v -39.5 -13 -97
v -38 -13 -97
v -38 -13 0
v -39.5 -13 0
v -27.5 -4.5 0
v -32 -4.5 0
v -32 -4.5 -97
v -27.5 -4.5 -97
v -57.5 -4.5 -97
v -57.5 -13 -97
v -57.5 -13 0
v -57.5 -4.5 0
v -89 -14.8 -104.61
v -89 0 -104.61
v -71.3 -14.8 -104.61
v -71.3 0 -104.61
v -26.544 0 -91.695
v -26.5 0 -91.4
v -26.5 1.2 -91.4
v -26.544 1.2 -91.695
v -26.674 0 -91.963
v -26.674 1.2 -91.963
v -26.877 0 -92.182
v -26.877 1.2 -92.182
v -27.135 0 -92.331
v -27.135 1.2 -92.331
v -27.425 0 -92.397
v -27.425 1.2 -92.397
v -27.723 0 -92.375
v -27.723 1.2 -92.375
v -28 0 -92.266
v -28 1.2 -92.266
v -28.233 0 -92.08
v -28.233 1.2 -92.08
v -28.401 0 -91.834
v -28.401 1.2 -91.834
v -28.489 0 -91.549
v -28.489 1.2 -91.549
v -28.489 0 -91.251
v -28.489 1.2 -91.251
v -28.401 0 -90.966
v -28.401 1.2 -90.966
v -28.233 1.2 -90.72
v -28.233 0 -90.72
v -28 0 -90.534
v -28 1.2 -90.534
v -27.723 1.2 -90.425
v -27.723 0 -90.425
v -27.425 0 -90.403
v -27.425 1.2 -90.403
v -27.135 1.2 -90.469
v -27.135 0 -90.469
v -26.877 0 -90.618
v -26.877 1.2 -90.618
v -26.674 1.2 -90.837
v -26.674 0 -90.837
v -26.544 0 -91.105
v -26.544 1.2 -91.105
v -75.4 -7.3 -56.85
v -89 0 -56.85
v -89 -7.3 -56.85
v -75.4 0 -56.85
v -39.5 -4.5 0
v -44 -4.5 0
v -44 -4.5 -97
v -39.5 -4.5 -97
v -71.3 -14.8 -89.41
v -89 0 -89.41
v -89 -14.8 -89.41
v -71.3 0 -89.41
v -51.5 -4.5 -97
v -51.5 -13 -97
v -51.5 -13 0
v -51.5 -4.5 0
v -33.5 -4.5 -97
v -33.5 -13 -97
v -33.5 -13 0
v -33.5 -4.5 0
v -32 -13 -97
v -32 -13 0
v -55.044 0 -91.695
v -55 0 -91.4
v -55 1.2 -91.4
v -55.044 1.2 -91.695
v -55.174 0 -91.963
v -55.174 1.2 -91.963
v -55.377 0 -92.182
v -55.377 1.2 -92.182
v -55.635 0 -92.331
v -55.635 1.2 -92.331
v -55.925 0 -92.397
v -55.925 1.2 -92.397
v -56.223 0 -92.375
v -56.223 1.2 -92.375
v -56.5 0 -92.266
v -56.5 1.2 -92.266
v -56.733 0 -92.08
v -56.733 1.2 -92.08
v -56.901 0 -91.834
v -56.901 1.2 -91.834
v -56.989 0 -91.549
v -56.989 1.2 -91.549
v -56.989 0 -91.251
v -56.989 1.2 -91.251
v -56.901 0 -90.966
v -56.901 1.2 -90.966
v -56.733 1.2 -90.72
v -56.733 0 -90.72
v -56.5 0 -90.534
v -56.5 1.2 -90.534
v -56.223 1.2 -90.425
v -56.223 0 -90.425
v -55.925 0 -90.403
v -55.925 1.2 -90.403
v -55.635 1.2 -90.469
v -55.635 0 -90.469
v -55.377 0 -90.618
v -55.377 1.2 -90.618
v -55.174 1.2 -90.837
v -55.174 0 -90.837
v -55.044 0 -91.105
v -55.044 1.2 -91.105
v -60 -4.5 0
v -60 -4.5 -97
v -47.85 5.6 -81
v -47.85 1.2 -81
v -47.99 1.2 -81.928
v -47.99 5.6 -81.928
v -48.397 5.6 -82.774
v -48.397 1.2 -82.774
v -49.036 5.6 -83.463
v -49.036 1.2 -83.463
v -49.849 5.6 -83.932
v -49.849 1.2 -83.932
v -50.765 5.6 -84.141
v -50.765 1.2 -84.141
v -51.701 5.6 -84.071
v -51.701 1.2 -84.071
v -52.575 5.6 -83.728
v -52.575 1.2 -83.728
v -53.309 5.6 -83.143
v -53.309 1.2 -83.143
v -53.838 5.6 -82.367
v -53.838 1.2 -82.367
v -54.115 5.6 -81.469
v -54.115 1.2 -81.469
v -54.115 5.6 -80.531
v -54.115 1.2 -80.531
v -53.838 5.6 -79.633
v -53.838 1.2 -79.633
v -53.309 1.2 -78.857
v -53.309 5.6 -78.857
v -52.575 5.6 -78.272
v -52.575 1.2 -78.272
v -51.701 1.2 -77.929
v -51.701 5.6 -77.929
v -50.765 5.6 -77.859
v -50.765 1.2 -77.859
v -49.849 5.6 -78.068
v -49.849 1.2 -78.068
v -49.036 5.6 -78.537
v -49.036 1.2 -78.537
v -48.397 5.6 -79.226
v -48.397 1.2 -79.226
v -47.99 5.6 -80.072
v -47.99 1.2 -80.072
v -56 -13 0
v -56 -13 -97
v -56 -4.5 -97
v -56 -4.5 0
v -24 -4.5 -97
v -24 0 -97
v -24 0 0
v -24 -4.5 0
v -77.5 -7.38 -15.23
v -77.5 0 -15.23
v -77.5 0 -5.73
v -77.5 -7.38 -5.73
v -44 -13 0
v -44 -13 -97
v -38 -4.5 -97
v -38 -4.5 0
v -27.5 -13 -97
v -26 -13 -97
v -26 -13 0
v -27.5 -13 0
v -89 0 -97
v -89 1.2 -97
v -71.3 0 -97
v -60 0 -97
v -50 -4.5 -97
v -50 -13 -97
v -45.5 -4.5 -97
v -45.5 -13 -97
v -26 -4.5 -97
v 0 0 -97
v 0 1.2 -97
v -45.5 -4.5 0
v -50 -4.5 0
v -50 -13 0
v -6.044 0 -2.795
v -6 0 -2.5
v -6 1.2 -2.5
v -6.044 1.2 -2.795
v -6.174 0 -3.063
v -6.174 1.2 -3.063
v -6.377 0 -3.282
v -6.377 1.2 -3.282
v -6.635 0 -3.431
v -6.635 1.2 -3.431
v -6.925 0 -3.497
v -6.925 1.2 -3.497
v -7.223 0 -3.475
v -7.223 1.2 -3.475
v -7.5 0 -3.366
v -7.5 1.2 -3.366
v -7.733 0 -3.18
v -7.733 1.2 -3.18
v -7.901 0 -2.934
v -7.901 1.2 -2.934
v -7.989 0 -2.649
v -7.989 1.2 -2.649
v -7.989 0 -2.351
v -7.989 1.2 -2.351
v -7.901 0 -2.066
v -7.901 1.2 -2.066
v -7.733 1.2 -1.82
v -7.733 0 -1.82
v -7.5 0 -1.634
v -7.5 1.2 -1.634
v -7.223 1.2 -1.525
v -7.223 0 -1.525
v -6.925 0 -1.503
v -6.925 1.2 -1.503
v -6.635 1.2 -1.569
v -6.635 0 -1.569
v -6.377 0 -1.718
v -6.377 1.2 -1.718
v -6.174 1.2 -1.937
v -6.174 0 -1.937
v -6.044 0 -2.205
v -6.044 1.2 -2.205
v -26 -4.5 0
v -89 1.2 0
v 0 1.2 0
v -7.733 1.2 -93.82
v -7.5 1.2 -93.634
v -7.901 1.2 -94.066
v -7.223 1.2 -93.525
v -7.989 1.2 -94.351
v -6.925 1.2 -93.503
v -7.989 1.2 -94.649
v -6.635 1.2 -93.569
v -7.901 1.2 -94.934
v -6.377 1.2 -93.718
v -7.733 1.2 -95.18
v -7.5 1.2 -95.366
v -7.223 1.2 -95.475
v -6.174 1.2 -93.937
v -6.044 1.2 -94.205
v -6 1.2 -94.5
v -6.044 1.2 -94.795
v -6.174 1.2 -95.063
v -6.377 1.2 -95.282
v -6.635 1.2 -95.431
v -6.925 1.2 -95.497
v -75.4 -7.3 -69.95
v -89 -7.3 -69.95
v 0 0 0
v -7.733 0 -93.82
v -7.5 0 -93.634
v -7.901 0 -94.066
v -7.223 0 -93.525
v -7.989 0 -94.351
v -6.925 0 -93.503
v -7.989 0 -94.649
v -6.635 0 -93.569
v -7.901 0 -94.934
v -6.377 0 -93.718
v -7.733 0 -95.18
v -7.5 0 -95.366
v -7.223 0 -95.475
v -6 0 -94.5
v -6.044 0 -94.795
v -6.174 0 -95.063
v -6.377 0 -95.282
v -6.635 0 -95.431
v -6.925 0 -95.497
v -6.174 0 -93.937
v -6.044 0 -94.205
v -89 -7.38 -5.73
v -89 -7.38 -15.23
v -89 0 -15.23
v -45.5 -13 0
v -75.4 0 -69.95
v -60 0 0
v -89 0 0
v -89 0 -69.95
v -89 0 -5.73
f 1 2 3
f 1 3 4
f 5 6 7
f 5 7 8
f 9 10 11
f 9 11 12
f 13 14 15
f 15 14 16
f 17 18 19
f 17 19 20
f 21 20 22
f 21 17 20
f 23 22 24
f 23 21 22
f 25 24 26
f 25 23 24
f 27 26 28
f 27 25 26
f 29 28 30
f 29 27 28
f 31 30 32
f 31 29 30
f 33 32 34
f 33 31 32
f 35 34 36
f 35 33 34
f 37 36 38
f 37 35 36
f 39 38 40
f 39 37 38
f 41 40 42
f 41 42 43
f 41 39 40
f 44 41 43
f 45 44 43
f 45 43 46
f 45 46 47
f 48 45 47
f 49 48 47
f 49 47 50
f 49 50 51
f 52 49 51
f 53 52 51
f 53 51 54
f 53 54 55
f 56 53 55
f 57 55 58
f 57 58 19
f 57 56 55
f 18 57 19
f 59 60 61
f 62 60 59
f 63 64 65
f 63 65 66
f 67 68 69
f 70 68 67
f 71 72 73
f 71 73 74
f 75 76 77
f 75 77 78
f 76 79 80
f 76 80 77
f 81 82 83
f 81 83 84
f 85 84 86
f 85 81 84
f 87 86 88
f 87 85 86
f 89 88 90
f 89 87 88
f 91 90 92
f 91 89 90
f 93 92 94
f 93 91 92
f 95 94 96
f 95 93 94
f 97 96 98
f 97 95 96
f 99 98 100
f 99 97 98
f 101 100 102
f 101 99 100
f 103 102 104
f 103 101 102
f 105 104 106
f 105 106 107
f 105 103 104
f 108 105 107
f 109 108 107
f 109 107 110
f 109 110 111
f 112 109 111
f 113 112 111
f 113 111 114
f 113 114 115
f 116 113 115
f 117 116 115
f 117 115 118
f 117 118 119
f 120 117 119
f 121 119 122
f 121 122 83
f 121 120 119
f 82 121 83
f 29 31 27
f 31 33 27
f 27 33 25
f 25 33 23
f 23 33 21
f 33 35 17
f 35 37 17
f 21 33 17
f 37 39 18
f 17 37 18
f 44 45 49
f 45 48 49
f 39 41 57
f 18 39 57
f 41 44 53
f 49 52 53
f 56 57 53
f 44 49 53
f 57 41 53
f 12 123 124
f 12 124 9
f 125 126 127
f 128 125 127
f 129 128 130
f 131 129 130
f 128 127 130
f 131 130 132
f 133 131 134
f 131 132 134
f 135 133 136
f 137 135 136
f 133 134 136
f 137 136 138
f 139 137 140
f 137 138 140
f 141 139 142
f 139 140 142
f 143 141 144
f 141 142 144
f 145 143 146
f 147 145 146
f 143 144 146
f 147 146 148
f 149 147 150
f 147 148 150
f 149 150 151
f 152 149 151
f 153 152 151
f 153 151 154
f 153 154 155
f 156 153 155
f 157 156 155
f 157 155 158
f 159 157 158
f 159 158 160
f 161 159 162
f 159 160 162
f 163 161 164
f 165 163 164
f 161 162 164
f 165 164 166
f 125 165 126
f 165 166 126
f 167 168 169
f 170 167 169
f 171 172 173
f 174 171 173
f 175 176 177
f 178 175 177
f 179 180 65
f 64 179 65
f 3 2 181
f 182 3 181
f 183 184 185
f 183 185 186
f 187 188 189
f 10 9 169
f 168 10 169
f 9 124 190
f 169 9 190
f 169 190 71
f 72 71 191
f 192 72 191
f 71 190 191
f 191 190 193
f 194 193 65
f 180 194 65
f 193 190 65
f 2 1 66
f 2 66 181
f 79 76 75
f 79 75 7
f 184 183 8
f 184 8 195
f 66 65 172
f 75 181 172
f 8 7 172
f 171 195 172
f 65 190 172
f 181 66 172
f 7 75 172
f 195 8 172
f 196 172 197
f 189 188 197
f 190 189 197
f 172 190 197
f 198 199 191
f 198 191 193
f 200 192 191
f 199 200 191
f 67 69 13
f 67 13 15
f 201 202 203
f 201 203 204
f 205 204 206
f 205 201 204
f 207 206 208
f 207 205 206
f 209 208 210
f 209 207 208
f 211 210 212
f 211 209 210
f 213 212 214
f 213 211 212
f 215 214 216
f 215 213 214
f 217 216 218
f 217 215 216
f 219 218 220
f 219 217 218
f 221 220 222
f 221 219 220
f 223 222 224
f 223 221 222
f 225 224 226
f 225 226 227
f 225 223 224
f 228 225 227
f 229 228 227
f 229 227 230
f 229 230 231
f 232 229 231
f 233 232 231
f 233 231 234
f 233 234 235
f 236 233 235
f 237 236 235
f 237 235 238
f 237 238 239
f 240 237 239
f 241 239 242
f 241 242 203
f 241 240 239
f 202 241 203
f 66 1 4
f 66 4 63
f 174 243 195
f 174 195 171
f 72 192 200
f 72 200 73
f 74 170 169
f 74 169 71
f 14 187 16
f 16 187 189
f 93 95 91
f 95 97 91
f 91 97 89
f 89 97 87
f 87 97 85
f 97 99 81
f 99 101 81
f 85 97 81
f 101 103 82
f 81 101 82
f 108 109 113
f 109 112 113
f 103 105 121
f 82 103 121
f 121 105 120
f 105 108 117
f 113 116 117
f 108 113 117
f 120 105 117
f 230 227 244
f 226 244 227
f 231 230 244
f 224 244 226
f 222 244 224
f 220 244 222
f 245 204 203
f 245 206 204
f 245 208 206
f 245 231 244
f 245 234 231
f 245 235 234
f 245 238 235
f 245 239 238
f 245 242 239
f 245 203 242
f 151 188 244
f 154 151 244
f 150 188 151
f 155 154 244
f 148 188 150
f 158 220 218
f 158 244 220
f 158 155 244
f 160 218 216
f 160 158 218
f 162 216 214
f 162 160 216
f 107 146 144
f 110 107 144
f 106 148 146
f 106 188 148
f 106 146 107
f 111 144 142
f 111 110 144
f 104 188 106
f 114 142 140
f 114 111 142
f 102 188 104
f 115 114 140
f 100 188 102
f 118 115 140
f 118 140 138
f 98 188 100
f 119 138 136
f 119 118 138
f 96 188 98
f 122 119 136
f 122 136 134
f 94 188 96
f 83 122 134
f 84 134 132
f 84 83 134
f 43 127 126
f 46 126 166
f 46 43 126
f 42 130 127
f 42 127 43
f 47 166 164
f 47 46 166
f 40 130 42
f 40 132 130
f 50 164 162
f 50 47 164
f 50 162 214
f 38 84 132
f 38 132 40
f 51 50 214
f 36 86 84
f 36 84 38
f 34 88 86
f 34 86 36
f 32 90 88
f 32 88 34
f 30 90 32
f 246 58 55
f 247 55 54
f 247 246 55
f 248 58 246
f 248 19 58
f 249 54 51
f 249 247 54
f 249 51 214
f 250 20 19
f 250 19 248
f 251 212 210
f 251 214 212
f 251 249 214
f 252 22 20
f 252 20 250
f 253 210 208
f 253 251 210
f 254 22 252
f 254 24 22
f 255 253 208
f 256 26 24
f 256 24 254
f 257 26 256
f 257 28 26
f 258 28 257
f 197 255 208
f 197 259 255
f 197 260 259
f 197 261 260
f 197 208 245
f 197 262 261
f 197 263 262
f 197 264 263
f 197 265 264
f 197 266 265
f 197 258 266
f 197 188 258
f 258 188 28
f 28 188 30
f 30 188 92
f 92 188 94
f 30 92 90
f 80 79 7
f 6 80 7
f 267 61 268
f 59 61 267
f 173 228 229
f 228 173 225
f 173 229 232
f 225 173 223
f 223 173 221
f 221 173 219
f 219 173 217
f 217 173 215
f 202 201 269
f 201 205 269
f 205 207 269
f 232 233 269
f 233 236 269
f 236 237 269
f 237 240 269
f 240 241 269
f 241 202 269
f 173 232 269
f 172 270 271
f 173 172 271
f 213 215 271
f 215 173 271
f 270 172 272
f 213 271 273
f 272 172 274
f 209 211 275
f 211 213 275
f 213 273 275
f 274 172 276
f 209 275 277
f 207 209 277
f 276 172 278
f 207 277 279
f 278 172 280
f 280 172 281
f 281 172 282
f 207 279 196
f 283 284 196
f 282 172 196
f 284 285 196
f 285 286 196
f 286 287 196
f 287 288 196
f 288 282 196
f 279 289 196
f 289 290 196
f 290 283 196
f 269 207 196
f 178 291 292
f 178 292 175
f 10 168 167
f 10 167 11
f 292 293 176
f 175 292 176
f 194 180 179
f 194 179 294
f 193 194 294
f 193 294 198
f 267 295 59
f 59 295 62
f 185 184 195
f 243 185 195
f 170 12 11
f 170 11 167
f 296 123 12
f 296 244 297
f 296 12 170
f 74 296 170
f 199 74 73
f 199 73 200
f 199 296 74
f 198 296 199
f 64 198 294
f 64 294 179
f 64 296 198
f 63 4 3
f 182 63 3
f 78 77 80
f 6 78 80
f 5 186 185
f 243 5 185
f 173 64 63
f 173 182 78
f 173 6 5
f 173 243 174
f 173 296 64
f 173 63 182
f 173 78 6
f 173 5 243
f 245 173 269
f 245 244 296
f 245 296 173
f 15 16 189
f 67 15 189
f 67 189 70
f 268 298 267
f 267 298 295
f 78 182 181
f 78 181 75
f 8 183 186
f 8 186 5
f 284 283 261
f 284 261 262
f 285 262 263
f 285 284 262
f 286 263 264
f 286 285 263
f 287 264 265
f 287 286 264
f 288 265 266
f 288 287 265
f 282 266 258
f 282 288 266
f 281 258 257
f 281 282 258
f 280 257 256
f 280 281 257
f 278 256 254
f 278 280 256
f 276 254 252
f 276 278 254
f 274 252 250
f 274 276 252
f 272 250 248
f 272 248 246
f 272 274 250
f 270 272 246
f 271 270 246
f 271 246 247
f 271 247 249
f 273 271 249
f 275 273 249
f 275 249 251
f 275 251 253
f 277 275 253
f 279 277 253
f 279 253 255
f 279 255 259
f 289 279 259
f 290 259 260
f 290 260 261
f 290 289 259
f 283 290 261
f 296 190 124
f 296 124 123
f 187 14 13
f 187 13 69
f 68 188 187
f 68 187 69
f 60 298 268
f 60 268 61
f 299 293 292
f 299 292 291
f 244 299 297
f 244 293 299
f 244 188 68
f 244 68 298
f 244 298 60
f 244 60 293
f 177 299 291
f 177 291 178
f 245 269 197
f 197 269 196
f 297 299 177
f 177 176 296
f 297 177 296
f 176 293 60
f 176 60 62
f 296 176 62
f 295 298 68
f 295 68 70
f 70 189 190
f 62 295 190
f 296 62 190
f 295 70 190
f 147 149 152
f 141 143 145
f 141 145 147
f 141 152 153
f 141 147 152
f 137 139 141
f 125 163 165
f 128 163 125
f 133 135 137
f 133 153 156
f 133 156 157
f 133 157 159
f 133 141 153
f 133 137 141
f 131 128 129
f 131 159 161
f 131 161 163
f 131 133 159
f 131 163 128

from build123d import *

# Parameters (mm, degrees)
SKETCH_1_W      = 89
SKETCH_1_H      = 97
SKETCH_1_R      = 1
EXTRUDE_1_DEPTH = 1.2
SKETCH_2_R      = 3.15
EXTRUDE_2_DEPTH = 4.4
SKETCH_3_W      = 36
SKETCH_3_H      = 97
EXTRUDE_3_DEPTH = 4.5
SKETCH_4_W      = 1.5
SKETCH_4_H      = 8.5
EXTRUDE_5_DEPTH = 97
SKETCH_5_W      = 13.6
SKETCH_5_H      = 13.1
EXTRUDE_6_DEPTH = 7.3
SKETCH_6_W      = 17.7
SKETCH_6_H      = 15.2
EXTRUDE_7_DEPTH = 14.8
SKETCH_7_W      = 11.5
SKETCH_7_H      = 9.5
EXTRUDE_8_DEPTH = 7.38


with BuildPart() as part:
    # 草图1 → 凸台-拉伸1 (new body)
    with BuildSketch(Plane(origin=(0, 0, 0), x_dir=(1, 0, 0), z_dir=(0, 1, 0))):
        with Locations((-44.5, 48.5)):
            Rectangle(SKETCH_1_W, SKETCH_1_H)
        with Locations((-7, 94.5)):
            Circle(SKETCH_1_R, mode=Mode.SUBTRACT)
        with Locations((-7, 2.5)):
            Circle(SKETCH_1_R, mode=Mode.SUBTRACT)
        with Locations((-56, 91.4)):
            Circle(SKETCH_1_R, mode=Mode.SUBTRACT)
        with Locations((-27.5, 91.4)):
            Circle(SKETCH_1_R, mode=Mode.SUBTRACT)
    extrude(amount=EXTRUDE_1_DEPTH)

    # 草图2 → 凸台-拉伸2 (add)
    with BuildSketch(Plane(origin=(0, 1.2, 0), x_dir=(1, 0, 0), z_dir=(0, 1, 0))):
        with Locations((-51, 81)):
            Circle(SKETCH_2_R)
    extrude(amount=EXTRUDE_2_DEPTH)

    # 草图3 → 凸台-拉伸3 (add)
    with BuildSketch(Plane.XZ):
        with Locations((-42, -48.5)):
            Rectangle(SKETCH_3_W, SKETCH_3_H)
    extrude(amount=EXTRUDE_3_DEPTH)

    # 草图4 → 凸台-拉伸5 (add, through all)
    with BuildSketch(Plane(origin=(0, 0, -97), x_dir=(-1, 0, 0), z_dir=(0, 0, -1))):
        with Locations((26.75, -8.75)):
            Rectangle(SKETCH_4_W, SKETCH_4_H)
        with Locations((32.75, -8.75)):
            Rectangle(SKETCH_4_W, SKETCH_4_H)
        with Locations((38.75, -8.75)):
            Rectangle(SKETCH_4_W, SKETCH_4_H)
        with Locations((44.75, -8.75)):
            Rectangle(SKETCH_4_W, SKETCH_4_H)
        with Locations((50.75, -8.75)):
            Rectangle(SKETCH_4_W, SKETCH_4_H)
        with Locations((56.75, -8.75)):
            Rectangle(SKETCH_4_W, SKETCH_4_H)
    extrude(amount=-EXTRUDE_5_DEPTH)

    # 草图5 → 凸台-拉伸6 (add)
    with BuildSketch(Plane.XZ):
        with Locations((-82.2, -63.4)):
            Rectangle(SKETCH_5_W, SKETCH_5_H)
    extrude(amount=EXTRUDE_6_DEPTH)

    # 草图6 → 凸台-拉伸7 (add)
    with BuildSketch(Plane.XZ):
        with Locations((-80.15, -97.01)):
            Rectangle(SKETCH_6_W, SKETCH_6_H)
    extrude(amount=EXTRUDE_7_DEPTH)

    # 草图7 → 凸台-拉伸8 (add)
    with BuildSketch(Plane.XZ):
        with Locations((-83.25, -10.48)):
            Rectangle(SKETCH_7_W, SKETCH_7_H)
    extrude(amount=EXTRUDE_8_DEPTH)


solid = part.part
